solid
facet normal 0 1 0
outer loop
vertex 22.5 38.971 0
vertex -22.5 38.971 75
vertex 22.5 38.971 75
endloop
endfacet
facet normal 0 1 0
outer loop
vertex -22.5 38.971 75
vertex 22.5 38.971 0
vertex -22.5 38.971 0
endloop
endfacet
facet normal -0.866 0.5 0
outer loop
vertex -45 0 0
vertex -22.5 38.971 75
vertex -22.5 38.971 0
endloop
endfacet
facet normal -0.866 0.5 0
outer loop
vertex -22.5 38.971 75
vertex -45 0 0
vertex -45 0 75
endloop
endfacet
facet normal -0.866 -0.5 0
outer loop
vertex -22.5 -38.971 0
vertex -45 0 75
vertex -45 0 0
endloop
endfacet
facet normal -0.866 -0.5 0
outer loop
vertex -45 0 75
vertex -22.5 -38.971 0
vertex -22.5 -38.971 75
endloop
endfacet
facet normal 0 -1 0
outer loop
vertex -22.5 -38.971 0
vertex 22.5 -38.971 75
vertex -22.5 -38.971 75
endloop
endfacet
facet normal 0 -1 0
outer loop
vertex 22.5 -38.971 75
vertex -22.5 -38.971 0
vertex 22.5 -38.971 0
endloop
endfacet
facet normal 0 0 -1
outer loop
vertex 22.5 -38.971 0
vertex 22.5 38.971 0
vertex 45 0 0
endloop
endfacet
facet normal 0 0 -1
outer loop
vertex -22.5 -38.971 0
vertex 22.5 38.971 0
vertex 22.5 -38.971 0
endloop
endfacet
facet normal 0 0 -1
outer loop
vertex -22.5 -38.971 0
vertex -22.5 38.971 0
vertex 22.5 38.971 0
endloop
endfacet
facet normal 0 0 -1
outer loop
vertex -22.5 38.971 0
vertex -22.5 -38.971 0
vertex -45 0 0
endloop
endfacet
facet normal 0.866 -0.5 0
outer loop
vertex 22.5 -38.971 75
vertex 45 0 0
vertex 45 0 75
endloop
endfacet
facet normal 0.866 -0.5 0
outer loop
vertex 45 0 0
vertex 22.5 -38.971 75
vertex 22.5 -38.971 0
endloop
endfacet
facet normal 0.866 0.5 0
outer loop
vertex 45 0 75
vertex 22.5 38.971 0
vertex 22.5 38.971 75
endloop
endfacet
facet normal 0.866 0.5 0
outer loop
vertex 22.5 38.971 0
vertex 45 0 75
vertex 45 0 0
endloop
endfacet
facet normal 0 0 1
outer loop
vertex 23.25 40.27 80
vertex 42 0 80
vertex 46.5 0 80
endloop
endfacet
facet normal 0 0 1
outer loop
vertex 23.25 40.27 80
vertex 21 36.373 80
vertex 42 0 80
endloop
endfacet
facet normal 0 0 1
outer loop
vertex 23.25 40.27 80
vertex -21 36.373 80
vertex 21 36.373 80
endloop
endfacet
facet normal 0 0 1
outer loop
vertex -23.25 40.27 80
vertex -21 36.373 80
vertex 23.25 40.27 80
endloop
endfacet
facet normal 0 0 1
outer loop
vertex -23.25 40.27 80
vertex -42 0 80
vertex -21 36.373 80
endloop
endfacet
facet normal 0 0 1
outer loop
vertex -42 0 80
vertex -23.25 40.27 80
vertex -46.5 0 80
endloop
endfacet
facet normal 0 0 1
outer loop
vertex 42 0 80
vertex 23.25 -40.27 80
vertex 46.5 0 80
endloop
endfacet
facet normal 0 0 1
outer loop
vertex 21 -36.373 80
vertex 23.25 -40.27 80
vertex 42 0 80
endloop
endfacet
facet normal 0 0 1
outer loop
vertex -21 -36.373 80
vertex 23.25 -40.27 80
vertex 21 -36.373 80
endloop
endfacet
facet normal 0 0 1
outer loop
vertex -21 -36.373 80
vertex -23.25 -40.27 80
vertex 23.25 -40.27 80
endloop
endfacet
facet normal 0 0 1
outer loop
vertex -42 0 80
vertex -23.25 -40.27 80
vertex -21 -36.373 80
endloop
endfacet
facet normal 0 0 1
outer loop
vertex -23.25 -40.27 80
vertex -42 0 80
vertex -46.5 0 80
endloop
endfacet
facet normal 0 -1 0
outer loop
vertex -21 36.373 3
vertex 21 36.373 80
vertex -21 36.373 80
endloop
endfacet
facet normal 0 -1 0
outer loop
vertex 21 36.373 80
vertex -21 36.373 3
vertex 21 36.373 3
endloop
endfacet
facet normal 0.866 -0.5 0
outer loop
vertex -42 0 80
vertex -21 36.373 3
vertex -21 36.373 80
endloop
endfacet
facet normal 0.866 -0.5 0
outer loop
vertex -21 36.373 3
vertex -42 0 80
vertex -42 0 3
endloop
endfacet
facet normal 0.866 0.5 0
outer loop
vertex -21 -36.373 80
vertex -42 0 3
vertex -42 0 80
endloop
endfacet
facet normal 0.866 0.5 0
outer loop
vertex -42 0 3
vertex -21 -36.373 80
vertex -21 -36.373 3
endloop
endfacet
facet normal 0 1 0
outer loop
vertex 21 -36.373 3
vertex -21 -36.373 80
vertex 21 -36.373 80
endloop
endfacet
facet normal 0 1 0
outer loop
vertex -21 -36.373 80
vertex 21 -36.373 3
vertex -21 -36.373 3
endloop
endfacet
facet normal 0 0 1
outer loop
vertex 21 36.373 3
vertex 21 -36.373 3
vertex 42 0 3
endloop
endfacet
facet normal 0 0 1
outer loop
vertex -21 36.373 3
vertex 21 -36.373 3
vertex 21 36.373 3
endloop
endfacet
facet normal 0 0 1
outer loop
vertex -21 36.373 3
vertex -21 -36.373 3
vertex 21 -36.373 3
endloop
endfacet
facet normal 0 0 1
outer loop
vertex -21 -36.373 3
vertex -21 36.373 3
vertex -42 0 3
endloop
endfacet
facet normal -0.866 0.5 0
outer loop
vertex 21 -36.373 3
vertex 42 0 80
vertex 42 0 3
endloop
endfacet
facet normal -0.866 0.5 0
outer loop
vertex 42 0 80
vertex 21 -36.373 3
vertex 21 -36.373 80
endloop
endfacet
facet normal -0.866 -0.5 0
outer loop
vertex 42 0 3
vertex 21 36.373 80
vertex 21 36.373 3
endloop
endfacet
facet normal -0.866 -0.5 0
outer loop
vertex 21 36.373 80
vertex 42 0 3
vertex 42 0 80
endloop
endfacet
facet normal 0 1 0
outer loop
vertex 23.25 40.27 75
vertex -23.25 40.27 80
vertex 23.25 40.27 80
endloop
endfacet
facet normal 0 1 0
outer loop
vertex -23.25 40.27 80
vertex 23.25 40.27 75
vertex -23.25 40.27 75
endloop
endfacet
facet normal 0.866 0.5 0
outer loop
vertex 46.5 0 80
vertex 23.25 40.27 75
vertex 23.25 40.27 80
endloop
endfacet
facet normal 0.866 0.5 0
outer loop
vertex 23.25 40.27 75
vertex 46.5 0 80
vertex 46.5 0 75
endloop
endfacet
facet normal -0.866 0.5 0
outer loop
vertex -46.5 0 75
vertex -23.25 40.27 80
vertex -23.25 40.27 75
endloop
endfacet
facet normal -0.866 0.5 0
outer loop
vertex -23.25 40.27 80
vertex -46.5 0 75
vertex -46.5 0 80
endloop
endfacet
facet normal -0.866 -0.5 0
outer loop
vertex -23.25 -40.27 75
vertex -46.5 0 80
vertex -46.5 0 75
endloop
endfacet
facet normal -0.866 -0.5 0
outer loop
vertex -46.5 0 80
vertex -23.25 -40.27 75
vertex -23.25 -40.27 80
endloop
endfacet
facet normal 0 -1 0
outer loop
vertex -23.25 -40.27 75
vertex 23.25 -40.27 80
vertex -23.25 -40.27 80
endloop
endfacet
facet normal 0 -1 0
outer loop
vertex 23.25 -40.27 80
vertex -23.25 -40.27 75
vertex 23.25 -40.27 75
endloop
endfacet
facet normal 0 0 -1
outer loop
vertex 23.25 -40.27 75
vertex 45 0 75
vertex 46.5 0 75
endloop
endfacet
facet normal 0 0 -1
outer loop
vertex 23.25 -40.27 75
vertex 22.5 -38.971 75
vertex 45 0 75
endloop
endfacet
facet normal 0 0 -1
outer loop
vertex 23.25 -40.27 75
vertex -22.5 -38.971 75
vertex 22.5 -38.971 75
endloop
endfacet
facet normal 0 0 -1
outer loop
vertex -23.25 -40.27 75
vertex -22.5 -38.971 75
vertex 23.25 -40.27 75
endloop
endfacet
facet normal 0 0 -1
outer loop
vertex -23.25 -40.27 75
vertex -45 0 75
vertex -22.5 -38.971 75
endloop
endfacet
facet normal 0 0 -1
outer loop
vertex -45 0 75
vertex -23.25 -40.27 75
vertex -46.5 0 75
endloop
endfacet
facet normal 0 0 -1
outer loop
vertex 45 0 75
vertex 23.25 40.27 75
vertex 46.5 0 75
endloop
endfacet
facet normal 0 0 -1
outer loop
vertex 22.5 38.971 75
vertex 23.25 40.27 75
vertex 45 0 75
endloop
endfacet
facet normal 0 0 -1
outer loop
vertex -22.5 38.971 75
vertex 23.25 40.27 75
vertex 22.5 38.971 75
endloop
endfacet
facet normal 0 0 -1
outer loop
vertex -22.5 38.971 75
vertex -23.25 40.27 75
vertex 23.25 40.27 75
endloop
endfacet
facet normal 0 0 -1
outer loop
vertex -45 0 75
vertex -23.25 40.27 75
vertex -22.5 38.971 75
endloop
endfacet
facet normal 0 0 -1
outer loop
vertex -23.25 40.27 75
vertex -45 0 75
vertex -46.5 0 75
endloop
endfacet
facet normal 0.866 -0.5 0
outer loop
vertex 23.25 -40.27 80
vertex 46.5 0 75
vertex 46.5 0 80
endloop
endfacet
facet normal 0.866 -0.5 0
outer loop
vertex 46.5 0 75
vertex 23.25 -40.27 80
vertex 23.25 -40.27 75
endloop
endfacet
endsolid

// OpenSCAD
side_length = 45;
wall_thickness = 3;
height = 80;
floor_thickness = 3;
lip_height = 5;
lip_offset = 1.5;

module hexagon(radius) {
    circle(r = radius, $fn = 6);
}

module main() {
    difference() {
        linear_extrude(height = height)
            hexagon(side_length);
        translate([0, 0, floor_thickness])
            linear_extrude(height = height)
                hexagon(side_length - wall_thickness);
    }
    translate([0, 0, height - lip_height])
        difference() {
            linear_extrude(height = lip_height)
                hexagon(side_length + lip_offset);
            linear_extrude(height = lip_height)
                hexagon(side_length);
        }
}

main();
